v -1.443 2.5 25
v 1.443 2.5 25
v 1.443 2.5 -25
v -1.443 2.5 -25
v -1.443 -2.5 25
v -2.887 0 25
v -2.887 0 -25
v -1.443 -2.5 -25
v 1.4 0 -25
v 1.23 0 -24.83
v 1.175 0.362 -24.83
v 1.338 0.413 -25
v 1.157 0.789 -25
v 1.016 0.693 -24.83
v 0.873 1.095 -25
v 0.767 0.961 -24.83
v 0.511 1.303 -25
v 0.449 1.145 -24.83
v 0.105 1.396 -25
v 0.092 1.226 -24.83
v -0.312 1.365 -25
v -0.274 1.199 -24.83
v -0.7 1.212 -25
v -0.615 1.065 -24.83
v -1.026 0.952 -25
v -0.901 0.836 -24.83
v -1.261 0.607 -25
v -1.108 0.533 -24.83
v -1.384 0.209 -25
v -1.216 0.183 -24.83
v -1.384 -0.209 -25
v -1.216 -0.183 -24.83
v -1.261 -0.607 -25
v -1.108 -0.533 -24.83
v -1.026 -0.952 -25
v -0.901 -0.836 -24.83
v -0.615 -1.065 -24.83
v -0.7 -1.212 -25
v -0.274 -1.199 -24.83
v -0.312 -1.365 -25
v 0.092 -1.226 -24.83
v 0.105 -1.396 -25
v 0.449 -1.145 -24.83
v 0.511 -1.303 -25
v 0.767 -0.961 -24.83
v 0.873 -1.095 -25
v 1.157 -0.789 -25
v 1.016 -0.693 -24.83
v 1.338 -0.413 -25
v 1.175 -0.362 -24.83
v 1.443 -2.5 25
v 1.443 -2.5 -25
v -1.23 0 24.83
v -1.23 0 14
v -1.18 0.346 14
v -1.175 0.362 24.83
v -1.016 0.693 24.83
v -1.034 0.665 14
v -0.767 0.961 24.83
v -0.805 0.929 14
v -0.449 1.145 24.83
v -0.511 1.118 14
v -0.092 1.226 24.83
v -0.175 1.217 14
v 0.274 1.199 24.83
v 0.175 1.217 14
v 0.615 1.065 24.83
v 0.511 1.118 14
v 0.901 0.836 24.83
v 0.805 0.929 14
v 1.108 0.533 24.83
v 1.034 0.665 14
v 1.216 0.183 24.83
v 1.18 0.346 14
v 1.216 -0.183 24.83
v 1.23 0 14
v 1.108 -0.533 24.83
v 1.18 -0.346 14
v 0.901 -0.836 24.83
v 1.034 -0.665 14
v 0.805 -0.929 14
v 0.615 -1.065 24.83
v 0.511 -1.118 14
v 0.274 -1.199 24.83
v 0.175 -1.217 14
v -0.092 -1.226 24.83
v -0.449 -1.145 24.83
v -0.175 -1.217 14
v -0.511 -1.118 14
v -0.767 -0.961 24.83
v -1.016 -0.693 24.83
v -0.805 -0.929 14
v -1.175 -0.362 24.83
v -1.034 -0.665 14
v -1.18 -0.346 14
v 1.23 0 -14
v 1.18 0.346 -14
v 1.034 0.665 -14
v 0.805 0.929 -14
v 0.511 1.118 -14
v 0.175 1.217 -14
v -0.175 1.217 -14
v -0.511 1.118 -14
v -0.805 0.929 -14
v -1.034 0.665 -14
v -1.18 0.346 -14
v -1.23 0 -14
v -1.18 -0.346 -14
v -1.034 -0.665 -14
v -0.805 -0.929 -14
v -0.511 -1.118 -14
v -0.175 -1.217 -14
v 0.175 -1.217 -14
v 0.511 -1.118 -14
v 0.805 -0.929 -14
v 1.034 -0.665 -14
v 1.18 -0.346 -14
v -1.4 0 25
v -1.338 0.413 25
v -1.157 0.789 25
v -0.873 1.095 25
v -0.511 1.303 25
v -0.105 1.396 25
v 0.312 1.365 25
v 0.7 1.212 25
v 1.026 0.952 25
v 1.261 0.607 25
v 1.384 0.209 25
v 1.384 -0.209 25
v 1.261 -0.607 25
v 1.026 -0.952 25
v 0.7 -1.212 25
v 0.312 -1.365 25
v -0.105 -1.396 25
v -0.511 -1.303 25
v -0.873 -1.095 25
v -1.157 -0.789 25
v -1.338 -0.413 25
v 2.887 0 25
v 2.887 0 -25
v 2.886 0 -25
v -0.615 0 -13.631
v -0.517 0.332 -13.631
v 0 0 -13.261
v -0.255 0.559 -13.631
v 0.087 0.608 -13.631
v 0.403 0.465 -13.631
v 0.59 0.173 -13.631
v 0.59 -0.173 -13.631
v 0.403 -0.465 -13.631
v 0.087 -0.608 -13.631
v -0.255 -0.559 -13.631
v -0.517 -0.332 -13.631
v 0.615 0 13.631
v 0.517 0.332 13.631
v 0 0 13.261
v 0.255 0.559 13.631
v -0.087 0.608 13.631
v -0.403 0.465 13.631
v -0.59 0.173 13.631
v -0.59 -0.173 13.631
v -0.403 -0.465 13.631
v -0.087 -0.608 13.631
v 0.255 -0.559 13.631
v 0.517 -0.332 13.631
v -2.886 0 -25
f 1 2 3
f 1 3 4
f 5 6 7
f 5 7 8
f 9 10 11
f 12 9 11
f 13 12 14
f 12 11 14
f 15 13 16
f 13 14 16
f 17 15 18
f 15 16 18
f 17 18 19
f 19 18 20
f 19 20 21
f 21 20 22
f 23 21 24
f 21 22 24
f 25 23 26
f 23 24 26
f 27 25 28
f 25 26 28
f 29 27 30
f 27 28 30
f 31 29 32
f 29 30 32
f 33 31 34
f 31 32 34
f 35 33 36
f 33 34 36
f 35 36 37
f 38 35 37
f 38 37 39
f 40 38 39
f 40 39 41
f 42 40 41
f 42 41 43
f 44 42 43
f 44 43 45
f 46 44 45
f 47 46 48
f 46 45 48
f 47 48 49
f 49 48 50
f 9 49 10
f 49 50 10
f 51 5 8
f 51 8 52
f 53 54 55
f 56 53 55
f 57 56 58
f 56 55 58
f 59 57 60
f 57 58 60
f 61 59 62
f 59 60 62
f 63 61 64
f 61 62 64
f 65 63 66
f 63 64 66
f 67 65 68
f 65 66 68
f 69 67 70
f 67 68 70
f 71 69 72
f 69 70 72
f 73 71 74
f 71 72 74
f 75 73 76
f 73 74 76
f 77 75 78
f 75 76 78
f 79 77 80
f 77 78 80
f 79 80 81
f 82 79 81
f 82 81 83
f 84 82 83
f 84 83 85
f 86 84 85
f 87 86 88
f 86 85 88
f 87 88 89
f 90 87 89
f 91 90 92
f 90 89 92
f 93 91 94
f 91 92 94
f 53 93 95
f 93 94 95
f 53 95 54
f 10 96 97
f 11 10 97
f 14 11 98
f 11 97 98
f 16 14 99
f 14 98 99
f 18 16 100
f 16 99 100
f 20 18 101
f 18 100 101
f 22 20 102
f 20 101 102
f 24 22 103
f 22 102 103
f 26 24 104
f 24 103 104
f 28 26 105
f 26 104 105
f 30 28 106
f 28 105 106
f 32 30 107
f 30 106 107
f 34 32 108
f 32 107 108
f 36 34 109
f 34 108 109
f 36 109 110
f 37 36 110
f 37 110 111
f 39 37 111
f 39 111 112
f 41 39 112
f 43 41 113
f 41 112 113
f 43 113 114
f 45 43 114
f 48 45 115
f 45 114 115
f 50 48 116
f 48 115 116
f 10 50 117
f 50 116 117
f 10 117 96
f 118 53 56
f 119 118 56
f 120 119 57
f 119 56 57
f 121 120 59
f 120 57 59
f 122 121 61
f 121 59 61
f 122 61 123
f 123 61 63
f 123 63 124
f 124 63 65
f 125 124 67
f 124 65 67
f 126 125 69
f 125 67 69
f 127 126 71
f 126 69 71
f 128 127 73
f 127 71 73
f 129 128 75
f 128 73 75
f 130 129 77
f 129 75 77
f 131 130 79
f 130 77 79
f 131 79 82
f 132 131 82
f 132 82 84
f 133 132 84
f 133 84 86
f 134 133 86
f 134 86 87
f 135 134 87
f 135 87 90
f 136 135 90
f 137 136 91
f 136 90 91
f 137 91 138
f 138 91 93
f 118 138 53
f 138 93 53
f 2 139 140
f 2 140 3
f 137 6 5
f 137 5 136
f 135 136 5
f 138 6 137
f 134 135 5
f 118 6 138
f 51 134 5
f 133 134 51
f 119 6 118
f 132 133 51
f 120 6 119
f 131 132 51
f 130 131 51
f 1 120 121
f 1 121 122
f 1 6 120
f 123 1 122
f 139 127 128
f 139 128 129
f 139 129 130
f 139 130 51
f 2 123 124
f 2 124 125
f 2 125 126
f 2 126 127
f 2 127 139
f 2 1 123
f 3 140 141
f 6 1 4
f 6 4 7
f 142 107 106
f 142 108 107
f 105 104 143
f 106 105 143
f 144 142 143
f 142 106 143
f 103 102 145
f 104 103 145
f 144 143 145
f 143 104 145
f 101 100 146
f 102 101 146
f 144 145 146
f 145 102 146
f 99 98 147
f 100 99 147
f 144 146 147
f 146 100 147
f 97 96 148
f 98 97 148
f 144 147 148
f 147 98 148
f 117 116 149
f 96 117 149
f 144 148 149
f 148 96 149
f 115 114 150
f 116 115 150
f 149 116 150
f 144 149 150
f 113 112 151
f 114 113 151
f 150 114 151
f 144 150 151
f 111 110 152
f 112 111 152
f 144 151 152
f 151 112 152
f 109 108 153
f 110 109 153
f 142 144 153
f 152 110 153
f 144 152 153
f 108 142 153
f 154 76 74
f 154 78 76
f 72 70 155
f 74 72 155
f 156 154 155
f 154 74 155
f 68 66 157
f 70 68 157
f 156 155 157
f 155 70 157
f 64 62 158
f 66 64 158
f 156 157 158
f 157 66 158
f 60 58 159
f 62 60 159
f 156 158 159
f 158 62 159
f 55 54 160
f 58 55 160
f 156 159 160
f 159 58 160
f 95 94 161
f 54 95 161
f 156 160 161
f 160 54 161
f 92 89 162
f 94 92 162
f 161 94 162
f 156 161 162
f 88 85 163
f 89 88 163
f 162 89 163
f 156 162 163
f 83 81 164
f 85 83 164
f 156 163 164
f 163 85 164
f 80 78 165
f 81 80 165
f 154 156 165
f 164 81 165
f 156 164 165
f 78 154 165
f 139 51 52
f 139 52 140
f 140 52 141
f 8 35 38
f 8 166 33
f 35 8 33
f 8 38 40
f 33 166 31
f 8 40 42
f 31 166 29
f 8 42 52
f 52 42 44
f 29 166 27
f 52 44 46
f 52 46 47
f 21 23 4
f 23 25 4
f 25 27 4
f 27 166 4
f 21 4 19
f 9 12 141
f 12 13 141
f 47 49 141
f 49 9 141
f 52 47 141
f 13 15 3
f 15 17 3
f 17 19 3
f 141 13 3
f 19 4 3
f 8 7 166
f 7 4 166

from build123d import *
from OCP.BRepFilletAPI import BRepFilletAPI_MakeChamfer

# Parameters (mm, degrees)
BOSS_EXTRUDE1_DEPTH      = 50
M2_CLEARANCE_HOLE1_D     = 2.459
M2_CLEARANCE_HOLE1_DEPTH = 11
M2_CLEARANCE_HOLE1_TIP   = 0.738758131
M2_CLEARANCE_HOLE2_D     = 2.459
M2_CLEARANCE_HOLE2_DEPTH = 11
M2_CLEARANCE_HOLE2_TIP   = 0.738758131
CHAMFER1_SIZE            = 0.000231998
CHAMFER1_SIZE2           = 0.000133944
CHAMFER2_SIZE            = 0.1705


with BuildPart() as part:
    # Sketch1 → Boss-Extrude1 (new body)
    with BuildSketch(Plane.XY.offset(25)):
        Polygon((-1.443375673, -2.5), (1.443375673, -2.5), (2.886751346, 0), (1.443375673, 2.5), (-1.443375673, 2.5), (-2.886751346, 0), align=None)
    extrude(amount=-BOSS_EXTRUDE1_DEPTH)

    # M2 Clearance Hole1
    with Locations(Plane(origin=(0, 0, -25), x_dir=(-1, 0, 0), z_dir=(0, 0, -1))):
        with Locations((0, 0)):
            Hole(M2_CLEARANCE_HOLE1_D / 2, depth=M2_CLEARANCE_HOLE1_DEPTH)
            with Locations((0, 0, -(M2_CLEARANCE_HOLE1_DEPTH + M2_CLEARANCE_HOLE1_TIP / 2))):  # 118° drill point
                Cone(0, M2_CLEARANCE_HOLE1_D / 2, M2_CLEARANCE_HOLE1_TIP, mode=Mode.SUBTRACT)

    # M2 Clearance Hole2
    with Locations(Plane.XY.offset(25)):
        with Locations((0, 0)):
            Hole(M2_CLEARANCE_HOLE2_D / 2, depth=M2_CLEARANCE_HOLE2_DEPTH)
            with Locations((0, 0, -(M2_CLEARANCE_HOLE2_DEPTH + M2_CLEARANCE_HOLE2_TIP / 2))):  # 118° drill point
                Cone(0, M2_CLEARANCE_HOLE2_D / 2, M2_CLEARANCE_HOLE2_TIP, mode=Mode.SUBTRACT)

    # Chamfer1: one chamfer whose edges measure the first distance from different faces: ONE call of the kernel's chamfer builder (chamfer() names one face for all edges)
    chamfer1_edges_1 = [part.edges().sort_by_distance(p)[0] for p in [
        (2.165063509, -1.25, -25),
        (2.165063509, 1.25, -25),
        (0, 2.5, -25),
        (-2.165063509, 1.25, -25),
        (-2.165063509, -1.25, -25),
        (0, -2.5, -25),
    ]]
    chamfer1_side_1 = [part.faces().sort_by_distance(p)[0] for p in [
        (0, -2.423623738, -25),
    ]]
    chamfer1_edges_2 = [part.edges().sort_by_distance(p)[0] for p in [
        (-2.165063509, 1.25, 25),
    ]]
    chamfer1_side_2 = [part.faces().sort_by_distance(p)[0] for p in [
        (-2.165063509, 1.25, 0),
    ]]
    chamfer1_edges_3 = [part.edges().sort_by_distance(p)[0] for p in [
        (0, 2.5, 25),
    ]]
    chamfer1_side_3 = [part.faces().sort_by_distance(p)[0] for p in [
        (0, 2.5, 0),
    ]]
    chamfer1_edges_4 = [part.edges().sort_by_distance(p)[0] for p in [
        (2.165063509, 1.25, 25),
    ]]
    chamfer1_side_4 = [part.faces().sort_by_distance(p)[0] for p in [
        (2.165063509, 1.25, 0),
    ]]
    chamfer1_edges_5 = [part.edges().sort_by_distance(p)[0] for p in [
        (2.165063509, -1.25, 25),
    ]]
    chamfer1_side_5 = [part.faces().sort_by_distance(p)[0] for p in [
        (2.165063509, -1.25, 0),
    ]]
    chamfer1_edges_6 = [part.edges().sort_by_distance(p)[0] for p in [
        (0, -2.5, 25),
    ]]
    chamfer1_side_6 = [part.faces().sort_by_distance(p)[0] for p in [
        (0, -2.5, 0),
    ]]
    chamfer1_edges_7 = [part.edges().sort_by_distance(p)[0] for p in [
        (-2.165063509, -1.25, 25),
    ]]
    chamfer1_side_7 = [part.faces().sort_by_distance(p)[0] for p in [
        (-2.165063509, -1.25, 0),
    ]]
    chamfer1 = BRepFilletAPI_MakeChamfer(part.part.solid().wrapped)
    for e in chamfer1_edges_1:
        chamfer1.Add(CHAMFER1_SIZE, CHAMFER1_SIZE2, e.wrapped, chamfer1_side_1[0].wrapped)  # the first distance lies on this face
    for e in chamfer1_edges_2:
        chamfer1.Add(CHAMFER1_SIZE, CHAMFER1_SIZE2, e.wrapped, chamfer1_side_2[0].wrapped)  # the first distance lies on this face
    for e in chamfer1_edges_3:
        chamfer1.Add(CHAMFER1_SIZE, CHAMFER1_SIZE2, e.wrapped, chamfer1_side_3[0].wrapped)  # the first distance lies on this face
    for e in chamfer1_edges_4:
        chamfer1.Add(CHAMFER1_SIZE, CHAMFER1_SIZE2, e.wrapped, chamfer1_side_4[0].wrapped)  # the first distance lies on this face
    for e in chamfer1_edges_5:
        chamfer1.Add(CHAMFER1_SIZE, CHAMFER1_SIZE2, e.wrapped, chamfer1_side_5[0].wrapped)  # the first distance lies on this face
    for e in chamfer1_edges_6:
        chamfer1.Add(CHAMFER1_SIZE, CHAMFER1_SIZE2, e.wrapped, chamfer1_side_6[0].wrapped)  # the first distance lies on this face
    for e in chamfer1_edges_7:
        chamfer1.Add(CHAMFER1_SIZE, CHAMFER1_SIZE2, e.wrapped, chamfer1_side_7[0].wrapped)  # the first distance lies on this face
    add(Compound.cast(chamfer1.Shape()), mode=Mode.REPLACE)

    # Chamfer2
    chamfer2_edges = [part.edges().sort_by_distance(p)[0] for p in [
        (-1.2295, 0, -25),
        (1.2295, 0, 25),
    ]]
    chamfer(chamfer2_edges, length=CHAMFER2_SIZE)


solid = part.part
